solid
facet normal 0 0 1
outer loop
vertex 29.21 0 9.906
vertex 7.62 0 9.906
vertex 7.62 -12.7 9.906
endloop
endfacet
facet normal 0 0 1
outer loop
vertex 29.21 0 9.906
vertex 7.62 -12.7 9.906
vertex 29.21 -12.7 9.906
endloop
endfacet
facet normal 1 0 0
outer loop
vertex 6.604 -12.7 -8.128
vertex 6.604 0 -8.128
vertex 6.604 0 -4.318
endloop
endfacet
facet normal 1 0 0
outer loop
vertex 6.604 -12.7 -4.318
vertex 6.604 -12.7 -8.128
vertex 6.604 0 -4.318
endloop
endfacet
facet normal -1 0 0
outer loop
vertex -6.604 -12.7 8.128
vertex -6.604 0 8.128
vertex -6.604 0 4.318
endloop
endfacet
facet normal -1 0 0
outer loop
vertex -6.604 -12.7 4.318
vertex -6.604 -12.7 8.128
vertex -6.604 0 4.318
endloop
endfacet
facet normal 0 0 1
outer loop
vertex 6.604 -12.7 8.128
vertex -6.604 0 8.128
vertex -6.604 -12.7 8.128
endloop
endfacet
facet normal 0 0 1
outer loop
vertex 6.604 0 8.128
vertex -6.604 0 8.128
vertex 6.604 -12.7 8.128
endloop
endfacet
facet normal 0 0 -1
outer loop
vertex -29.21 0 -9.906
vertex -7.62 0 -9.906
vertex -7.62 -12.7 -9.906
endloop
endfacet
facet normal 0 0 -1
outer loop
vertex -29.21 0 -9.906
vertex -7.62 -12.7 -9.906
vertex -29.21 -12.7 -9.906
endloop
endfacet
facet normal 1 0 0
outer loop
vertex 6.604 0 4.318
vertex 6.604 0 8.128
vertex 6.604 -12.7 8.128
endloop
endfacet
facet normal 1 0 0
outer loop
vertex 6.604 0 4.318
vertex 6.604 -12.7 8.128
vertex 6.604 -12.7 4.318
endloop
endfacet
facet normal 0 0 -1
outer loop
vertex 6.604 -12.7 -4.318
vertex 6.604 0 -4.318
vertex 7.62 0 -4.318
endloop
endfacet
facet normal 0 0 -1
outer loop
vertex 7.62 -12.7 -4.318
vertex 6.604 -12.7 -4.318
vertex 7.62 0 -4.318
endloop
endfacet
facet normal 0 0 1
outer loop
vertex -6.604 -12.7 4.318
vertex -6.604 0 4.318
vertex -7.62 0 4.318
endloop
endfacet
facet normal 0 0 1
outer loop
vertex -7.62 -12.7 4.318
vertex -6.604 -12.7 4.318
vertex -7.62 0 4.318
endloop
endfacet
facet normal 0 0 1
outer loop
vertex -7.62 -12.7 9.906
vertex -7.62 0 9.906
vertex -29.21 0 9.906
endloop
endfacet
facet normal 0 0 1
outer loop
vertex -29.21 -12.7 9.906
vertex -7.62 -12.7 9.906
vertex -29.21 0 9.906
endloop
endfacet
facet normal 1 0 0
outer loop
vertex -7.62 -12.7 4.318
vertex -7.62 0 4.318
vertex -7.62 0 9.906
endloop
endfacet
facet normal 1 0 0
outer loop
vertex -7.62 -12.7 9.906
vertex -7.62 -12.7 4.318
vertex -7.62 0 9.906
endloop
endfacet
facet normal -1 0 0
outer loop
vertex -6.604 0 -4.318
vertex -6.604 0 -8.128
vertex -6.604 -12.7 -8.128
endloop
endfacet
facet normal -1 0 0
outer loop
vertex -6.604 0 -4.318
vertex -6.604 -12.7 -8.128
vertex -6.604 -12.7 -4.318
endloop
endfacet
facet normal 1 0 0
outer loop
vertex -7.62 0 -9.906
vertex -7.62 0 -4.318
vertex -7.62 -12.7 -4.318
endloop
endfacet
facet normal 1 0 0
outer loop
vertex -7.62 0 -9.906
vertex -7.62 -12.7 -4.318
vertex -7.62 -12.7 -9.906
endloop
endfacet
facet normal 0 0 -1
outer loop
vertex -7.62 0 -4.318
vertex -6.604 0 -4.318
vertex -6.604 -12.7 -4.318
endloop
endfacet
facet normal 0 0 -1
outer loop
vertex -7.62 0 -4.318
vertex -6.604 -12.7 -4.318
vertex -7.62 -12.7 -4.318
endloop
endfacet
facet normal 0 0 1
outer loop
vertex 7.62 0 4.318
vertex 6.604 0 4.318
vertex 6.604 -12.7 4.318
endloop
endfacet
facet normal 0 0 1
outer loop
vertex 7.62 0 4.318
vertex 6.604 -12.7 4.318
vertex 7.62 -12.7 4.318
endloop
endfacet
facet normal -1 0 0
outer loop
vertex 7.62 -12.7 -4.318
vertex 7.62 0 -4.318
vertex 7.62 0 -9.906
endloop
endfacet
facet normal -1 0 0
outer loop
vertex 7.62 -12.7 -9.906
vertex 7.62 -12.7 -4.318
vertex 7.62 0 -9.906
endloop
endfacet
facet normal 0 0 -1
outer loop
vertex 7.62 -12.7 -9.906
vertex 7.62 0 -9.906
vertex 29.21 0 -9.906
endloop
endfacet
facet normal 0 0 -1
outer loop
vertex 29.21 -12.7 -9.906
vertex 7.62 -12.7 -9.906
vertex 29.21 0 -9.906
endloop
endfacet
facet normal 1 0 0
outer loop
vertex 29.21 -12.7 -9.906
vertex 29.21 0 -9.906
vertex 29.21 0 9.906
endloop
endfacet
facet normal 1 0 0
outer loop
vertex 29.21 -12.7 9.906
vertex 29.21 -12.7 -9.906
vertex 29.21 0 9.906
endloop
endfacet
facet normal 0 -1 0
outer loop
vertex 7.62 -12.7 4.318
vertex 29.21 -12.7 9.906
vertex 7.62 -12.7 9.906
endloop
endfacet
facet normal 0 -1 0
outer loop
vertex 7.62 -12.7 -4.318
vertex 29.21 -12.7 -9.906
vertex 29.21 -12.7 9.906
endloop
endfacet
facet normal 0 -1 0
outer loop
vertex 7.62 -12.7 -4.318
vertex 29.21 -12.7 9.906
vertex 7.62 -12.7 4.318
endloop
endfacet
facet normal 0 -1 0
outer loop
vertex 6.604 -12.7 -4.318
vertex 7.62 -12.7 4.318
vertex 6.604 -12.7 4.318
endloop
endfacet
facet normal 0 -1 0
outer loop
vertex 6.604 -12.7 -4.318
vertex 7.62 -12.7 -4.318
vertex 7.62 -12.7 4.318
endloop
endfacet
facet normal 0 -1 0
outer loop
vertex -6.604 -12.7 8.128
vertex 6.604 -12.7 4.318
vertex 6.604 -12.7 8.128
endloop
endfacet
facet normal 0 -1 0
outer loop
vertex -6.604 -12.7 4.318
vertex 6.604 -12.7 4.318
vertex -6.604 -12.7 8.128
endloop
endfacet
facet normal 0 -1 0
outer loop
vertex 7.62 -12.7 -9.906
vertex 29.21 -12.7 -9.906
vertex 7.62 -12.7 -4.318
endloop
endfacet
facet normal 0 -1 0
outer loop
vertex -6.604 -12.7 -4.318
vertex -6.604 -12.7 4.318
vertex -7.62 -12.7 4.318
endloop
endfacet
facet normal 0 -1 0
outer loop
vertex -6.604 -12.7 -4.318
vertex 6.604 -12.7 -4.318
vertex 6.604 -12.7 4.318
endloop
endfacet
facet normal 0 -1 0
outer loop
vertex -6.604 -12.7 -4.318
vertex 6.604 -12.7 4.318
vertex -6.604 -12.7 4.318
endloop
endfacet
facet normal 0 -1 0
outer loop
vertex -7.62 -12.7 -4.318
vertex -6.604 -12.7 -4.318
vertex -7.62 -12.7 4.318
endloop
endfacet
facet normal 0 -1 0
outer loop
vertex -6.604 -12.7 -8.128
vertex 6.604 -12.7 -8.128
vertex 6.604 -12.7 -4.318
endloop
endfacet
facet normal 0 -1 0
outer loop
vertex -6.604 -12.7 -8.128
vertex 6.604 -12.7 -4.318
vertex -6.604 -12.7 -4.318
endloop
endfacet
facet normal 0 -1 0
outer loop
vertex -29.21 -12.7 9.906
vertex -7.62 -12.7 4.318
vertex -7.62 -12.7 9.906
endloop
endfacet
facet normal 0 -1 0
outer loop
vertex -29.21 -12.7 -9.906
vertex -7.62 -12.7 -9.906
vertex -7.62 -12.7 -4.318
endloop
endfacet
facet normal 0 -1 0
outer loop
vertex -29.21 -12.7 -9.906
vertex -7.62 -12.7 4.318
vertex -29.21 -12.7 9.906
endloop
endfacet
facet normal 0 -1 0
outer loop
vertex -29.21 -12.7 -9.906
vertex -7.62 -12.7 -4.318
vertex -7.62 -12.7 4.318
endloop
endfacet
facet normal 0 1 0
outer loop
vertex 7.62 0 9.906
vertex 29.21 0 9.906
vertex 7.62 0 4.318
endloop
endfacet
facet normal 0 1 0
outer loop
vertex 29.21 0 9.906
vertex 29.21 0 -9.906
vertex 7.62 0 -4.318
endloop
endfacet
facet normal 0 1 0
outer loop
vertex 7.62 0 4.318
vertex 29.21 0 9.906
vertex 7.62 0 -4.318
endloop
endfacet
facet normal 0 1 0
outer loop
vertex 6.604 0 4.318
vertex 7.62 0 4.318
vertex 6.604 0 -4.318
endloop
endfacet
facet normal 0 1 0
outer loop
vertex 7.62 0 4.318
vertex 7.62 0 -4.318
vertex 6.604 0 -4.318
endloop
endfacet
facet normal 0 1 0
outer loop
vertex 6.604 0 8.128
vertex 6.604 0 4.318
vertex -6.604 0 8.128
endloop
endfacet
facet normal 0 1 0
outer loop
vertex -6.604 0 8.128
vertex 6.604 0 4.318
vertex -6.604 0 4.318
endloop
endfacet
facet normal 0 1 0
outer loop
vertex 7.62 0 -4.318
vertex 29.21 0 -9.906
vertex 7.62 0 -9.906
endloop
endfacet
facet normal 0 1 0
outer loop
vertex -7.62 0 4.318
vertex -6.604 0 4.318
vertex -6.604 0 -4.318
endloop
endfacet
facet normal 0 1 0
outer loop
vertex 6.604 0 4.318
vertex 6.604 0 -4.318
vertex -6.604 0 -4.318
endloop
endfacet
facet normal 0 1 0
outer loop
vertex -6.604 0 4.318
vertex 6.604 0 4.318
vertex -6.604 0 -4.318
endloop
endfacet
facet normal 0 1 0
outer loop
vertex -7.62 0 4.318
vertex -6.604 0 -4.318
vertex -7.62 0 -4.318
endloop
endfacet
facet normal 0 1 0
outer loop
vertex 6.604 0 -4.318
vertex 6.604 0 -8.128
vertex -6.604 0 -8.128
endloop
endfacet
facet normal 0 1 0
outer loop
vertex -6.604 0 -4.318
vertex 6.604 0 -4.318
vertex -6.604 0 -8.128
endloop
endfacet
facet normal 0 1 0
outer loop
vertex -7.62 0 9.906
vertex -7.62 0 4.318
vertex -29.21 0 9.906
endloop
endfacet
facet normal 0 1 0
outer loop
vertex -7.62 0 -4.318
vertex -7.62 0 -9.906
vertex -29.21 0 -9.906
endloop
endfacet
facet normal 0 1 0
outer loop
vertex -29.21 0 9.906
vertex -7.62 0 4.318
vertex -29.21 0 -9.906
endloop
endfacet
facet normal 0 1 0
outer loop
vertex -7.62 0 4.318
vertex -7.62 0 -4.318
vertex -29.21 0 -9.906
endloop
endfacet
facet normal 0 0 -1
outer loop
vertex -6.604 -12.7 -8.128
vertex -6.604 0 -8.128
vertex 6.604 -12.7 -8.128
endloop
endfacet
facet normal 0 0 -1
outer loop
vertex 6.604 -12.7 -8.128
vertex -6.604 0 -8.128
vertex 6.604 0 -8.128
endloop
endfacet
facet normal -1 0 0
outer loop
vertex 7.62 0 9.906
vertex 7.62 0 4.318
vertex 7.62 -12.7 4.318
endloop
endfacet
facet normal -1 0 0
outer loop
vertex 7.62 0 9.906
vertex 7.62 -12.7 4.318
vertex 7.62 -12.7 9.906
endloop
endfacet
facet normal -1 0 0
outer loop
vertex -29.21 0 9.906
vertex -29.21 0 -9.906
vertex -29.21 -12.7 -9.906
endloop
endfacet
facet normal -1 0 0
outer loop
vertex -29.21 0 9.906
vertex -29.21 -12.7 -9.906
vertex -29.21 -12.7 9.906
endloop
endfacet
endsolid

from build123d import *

# Parameters (mm, degrees)
F1_DEPTH = 12.7


with BuildPart() as f1:
    # F0 (on Front) → F1 (new body)
    with BuildSketch(Plane.XZ):
        Polygon((-29.21, 0), (0, 0), (0, 8.128), (-6.604, 8.128), (-6.604, 4.318), (-7.62, 4.318), (-7.62, 9.906), (-29.21, 9.906), align=None)
    extrude(amount=F1_DEPTH)

    # F2: F1 across face


with BuildPart() as f1_1:
    add(f1.part)
    add(f1.part.mirror(Plane(origin=(-14.605, -6.35, 0), x_dir=(1, 0, 0), z_dir=(0, 0, -1))))

    # F3: F1 across face


with BuildPart() as f1_2:
    add(f1_1.part)
    add(f1_1.part.mirror(Plane(origin=(0, -6.35, 0), x_dir=(0, 1, 0), z_dir=(1, 0, 0))))


solid = f1_2.part
